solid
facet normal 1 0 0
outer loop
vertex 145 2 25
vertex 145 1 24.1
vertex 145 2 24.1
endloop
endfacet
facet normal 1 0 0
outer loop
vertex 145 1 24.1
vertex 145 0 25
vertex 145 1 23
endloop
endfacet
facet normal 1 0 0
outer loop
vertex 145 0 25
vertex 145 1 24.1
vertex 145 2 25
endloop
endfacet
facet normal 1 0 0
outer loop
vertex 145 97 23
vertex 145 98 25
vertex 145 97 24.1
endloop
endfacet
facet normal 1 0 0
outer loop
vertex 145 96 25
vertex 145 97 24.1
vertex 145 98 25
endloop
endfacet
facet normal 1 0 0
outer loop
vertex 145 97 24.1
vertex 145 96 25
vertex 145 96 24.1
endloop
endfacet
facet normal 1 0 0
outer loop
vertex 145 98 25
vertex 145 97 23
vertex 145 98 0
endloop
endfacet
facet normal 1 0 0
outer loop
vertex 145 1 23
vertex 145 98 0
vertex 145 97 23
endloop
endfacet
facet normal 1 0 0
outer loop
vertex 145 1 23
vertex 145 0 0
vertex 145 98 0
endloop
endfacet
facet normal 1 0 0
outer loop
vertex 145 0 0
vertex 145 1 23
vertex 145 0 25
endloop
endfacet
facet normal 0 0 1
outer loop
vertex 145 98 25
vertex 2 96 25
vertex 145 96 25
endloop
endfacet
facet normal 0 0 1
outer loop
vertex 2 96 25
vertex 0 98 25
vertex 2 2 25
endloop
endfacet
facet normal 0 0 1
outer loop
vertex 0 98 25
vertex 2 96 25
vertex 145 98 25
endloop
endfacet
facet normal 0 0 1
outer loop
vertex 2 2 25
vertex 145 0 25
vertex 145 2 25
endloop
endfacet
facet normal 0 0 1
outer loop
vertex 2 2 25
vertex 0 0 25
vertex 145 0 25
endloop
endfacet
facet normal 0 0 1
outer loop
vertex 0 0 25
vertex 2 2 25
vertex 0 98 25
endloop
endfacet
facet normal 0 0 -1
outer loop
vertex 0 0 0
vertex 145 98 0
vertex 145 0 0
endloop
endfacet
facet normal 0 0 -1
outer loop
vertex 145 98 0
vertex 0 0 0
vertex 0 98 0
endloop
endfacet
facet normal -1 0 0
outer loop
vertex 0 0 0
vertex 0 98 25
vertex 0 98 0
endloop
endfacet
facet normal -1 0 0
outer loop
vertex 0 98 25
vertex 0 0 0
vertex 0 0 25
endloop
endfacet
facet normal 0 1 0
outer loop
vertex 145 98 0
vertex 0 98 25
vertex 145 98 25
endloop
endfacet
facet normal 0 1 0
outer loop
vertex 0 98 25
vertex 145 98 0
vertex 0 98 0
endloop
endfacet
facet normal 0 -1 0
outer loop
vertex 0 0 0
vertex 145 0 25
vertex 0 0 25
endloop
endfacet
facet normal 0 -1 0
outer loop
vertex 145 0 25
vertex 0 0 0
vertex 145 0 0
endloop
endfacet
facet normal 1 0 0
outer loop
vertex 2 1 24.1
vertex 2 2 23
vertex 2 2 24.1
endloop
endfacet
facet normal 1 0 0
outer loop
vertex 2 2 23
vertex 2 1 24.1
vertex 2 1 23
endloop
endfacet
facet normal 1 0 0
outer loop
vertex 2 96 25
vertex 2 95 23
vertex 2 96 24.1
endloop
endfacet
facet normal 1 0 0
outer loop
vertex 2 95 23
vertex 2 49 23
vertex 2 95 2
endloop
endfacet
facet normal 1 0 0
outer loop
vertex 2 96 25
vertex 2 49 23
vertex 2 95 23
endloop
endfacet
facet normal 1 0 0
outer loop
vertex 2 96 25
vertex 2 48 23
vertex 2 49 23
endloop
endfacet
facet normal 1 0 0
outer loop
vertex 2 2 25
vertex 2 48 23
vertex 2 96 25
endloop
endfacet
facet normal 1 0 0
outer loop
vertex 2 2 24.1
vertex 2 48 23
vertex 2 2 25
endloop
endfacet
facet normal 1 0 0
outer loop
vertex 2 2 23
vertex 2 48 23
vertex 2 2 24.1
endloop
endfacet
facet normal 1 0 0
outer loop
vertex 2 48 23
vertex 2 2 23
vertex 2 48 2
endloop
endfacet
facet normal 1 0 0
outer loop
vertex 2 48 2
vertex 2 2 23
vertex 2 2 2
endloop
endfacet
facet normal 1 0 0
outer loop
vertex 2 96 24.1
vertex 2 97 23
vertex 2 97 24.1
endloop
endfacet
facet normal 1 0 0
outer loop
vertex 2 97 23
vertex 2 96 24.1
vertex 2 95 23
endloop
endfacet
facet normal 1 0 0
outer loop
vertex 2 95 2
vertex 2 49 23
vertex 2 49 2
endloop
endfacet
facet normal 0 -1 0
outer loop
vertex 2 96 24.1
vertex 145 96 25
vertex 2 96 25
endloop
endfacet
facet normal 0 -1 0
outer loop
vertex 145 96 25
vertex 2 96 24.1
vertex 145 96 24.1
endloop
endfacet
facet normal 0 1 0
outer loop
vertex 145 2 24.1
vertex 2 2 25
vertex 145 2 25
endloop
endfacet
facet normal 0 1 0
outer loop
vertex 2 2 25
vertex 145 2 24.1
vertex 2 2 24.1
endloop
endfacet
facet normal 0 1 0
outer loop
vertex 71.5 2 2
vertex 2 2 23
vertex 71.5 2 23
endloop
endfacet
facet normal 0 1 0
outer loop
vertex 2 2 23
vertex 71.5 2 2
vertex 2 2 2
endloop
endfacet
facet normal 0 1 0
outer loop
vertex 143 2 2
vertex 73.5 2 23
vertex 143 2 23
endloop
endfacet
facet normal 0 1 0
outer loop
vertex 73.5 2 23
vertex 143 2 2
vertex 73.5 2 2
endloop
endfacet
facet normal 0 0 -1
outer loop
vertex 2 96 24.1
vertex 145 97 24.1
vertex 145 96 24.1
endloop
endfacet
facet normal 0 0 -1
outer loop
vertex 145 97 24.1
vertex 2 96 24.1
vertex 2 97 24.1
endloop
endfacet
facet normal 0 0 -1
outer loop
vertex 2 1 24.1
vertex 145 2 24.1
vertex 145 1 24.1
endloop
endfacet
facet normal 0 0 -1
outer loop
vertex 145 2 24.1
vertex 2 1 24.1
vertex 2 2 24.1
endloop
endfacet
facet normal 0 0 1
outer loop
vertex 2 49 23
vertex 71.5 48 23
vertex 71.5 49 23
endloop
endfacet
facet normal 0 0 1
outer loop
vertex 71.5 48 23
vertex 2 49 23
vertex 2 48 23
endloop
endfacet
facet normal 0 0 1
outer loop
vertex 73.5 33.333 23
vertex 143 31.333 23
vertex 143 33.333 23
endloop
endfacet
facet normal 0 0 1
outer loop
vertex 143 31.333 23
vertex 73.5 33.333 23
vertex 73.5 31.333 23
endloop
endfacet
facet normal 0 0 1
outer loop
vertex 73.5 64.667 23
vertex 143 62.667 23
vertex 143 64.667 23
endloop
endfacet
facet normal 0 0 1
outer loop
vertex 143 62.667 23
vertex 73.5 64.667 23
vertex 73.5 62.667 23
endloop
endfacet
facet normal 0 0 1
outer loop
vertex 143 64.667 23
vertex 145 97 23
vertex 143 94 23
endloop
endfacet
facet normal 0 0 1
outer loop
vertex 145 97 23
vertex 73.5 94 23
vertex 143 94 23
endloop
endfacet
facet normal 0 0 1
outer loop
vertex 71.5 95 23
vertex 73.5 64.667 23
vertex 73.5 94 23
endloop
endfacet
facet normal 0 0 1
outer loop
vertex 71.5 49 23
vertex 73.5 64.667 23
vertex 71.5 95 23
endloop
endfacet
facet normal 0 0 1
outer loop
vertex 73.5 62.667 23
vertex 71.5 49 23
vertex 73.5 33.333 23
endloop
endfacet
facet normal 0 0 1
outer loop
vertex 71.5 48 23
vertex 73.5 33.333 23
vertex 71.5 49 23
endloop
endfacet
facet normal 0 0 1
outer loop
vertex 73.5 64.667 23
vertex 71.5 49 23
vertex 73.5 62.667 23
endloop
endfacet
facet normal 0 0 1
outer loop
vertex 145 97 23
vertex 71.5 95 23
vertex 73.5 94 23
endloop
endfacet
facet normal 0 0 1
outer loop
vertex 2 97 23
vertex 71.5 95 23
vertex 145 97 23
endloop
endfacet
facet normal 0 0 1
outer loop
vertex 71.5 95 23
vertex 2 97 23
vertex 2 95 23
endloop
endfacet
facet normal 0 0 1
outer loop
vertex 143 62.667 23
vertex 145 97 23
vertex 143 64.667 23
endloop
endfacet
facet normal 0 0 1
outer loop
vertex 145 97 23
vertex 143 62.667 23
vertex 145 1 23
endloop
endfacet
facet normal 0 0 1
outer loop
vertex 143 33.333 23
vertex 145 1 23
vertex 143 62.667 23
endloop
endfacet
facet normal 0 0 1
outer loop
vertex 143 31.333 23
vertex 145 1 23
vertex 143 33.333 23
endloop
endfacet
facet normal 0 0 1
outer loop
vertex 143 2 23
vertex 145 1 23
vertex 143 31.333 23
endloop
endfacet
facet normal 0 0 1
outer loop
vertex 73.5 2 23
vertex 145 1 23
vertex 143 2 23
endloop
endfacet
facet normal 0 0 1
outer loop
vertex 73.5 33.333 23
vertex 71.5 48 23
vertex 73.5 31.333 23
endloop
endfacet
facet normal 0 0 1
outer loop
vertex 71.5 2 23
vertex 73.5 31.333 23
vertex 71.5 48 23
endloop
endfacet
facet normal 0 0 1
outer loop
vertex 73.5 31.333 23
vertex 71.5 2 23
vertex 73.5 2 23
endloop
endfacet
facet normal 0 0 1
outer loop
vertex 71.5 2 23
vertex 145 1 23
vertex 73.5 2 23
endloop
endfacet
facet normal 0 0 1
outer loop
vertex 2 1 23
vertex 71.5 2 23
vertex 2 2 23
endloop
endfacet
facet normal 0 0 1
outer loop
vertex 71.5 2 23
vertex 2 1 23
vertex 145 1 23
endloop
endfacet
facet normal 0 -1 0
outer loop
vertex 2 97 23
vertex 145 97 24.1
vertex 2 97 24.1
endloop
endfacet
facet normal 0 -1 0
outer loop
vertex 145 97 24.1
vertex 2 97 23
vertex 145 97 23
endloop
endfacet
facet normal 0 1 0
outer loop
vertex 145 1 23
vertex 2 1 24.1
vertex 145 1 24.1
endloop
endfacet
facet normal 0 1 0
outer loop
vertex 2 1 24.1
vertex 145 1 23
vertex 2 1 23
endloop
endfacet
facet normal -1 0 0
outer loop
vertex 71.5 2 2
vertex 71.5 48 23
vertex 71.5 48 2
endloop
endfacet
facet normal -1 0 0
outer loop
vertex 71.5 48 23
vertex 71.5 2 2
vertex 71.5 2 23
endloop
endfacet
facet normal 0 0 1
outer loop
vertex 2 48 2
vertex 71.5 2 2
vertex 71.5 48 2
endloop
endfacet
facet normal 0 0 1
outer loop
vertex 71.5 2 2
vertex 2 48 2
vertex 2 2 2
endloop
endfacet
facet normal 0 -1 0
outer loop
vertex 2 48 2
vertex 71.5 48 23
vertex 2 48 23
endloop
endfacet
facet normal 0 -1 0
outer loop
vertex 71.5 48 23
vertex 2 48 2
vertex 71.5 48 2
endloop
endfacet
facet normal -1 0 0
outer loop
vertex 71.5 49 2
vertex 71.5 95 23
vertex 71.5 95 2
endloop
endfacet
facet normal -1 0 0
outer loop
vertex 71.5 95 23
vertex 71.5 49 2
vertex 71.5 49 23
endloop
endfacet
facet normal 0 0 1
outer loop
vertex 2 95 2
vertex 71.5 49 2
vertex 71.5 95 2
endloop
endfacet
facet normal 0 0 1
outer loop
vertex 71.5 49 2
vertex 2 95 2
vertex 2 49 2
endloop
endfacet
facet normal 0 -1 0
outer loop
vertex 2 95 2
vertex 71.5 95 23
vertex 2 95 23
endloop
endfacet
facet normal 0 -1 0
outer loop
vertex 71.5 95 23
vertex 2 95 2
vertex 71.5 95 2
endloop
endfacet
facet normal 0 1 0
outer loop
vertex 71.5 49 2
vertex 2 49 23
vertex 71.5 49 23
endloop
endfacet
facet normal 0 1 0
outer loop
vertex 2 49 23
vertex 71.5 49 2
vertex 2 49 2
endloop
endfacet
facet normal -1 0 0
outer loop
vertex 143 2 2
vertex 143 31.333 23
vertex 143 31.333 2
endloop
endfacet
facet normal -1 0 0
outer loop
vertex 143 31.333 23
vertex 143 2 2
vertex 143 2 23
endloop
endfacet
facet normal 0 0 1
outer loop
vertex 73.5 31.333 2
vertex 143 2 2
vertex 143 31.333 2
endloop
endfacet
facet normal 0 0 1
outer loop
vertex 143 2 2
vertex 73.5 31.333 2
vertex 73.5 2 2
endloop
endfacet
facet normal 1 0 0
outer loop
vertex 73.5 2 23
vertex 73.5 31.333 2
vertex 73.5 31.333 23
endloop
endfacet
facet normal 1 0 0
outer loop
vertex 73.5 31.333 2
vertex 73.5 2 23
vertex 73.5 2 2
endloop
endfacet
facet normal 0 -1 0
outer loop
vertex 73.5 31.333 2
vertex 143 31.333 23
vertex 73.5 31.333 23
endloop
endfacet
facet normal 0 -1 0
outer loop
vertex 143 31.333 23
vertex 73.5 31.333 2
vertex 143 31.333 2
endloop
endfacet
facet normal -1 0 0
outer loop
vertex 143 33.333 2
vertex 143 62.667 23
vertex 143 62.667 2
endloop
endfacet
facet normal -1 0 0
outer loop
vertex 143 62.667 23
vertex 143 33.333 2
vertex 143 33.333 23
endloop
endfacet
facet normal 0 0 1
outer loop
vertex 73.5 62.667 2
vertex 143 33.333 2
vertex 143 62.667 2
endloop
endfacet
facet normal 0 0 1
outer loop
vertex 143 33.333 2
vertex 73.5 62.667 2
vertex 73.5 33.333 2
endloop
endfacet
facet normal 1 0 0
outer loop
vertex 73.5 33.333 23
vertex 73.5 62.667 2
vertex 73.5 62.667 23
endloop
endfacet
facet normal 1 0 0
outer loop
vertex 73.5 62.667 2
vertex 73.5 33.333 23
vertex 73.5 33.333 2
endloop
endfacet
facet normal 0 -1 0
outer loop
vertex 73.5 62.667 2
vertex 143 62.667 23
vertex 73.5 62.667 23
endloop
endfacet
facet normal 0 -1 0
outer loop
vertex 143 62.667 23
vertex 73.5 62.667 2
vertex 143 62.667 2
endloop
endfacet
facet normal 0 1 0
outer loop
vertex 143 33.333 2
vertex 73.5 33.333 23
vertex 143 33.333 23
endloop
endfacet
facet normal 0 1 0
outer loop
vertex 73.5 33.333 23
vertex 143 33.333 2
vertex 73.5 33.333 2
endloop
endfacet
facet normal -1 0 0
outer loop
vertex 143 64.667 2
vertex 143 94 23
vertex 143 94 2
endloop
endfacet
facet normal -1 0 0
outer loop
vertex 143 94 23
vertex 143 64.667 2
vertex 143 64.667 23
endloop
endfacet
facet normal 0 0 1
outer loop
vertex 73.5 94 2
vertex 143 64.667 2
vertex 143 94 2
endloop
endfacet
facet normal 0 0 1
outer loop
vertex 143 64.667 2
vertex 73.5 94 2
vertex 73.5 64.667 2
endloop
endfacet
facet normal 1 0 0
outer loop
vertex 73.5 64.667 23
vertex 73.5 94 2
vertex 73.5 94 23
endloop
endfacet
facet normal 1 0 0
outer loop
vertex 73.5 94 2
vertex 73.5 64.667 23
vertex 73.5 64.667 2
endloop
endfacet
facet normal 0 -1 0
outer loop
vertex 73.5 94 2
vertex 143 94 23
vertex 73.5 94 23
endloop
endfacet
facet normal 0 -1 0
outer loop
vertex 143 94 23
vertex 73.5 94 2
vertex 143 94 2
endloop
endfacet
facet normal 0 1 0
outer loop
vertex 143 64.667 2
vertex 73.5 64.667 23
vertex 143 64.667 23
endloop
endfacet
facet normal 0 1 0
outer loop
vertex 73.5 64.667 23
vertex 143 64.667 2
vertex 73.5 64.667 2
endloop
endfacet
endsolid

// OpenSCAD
// +++ CONFIG +++
X_CARD = 145;
Y_CARD = 98; 
Z_CARD = 25;

R_FINGERHELP =10;

PW_FLOOR = 2; // PoWer
PW_WALL = 1.5;
X_LEN_WALL = len_wall(15); // LENght
Y_LEN_WALL = len_wall(7);
function len_wall(len_wall) = len_wall+PW_WALL;



// +++ MAKE +++
difference() {
	cube([ X_CARD , Y_CARD , Z_CARD ]);
	// Deckel
	translate([ 2 , 2 , Z_CARD-1 ]) cube([ X_CARD , Y_CARD-4 , 1.1 ]);
	translate([ 2 , 1 , Z_CARD-2 ]) cube([ X_CARD , Y_CARD-2 , 1.1 ]);
	// Ruhm
	translate([ 2 , 2 , 2 ])                               cube([ (X_CARD-4)/2-1 , (Y_CARD-4)/2-1 , Z_CARD ]);
	translate([ 2 , (Y_CARD-4)/2+2 , 2 ])                  cube([ (X_CARD-4)/2-1 , (Y_CARD-4)/2-1 , Z_CARD ]);
	
	translate([ (X_CARD-4)/2+3 , 2 , 2 ])                  cube([ (X_CARD-4)/2-1 , (Y_CARD-4)/3-2 , Z_CARD ]);
	translate([ (X_CARD-4)/2+3 , (Y_CARD-4)/3+2 , 2 ])     cube([ (X_CARD-4)/2-1 , (Y_CARD-4)/3-2 , Z_CARD ]);
	translate([ (X_CARD-4)/2+3 , 2*((Y_CARD-4)/3)+2 , 2 ]) cube([ (X_CARD-4)/2-1 , (Y_CARD-4)/3-2 , Z_CARD ]);
};
